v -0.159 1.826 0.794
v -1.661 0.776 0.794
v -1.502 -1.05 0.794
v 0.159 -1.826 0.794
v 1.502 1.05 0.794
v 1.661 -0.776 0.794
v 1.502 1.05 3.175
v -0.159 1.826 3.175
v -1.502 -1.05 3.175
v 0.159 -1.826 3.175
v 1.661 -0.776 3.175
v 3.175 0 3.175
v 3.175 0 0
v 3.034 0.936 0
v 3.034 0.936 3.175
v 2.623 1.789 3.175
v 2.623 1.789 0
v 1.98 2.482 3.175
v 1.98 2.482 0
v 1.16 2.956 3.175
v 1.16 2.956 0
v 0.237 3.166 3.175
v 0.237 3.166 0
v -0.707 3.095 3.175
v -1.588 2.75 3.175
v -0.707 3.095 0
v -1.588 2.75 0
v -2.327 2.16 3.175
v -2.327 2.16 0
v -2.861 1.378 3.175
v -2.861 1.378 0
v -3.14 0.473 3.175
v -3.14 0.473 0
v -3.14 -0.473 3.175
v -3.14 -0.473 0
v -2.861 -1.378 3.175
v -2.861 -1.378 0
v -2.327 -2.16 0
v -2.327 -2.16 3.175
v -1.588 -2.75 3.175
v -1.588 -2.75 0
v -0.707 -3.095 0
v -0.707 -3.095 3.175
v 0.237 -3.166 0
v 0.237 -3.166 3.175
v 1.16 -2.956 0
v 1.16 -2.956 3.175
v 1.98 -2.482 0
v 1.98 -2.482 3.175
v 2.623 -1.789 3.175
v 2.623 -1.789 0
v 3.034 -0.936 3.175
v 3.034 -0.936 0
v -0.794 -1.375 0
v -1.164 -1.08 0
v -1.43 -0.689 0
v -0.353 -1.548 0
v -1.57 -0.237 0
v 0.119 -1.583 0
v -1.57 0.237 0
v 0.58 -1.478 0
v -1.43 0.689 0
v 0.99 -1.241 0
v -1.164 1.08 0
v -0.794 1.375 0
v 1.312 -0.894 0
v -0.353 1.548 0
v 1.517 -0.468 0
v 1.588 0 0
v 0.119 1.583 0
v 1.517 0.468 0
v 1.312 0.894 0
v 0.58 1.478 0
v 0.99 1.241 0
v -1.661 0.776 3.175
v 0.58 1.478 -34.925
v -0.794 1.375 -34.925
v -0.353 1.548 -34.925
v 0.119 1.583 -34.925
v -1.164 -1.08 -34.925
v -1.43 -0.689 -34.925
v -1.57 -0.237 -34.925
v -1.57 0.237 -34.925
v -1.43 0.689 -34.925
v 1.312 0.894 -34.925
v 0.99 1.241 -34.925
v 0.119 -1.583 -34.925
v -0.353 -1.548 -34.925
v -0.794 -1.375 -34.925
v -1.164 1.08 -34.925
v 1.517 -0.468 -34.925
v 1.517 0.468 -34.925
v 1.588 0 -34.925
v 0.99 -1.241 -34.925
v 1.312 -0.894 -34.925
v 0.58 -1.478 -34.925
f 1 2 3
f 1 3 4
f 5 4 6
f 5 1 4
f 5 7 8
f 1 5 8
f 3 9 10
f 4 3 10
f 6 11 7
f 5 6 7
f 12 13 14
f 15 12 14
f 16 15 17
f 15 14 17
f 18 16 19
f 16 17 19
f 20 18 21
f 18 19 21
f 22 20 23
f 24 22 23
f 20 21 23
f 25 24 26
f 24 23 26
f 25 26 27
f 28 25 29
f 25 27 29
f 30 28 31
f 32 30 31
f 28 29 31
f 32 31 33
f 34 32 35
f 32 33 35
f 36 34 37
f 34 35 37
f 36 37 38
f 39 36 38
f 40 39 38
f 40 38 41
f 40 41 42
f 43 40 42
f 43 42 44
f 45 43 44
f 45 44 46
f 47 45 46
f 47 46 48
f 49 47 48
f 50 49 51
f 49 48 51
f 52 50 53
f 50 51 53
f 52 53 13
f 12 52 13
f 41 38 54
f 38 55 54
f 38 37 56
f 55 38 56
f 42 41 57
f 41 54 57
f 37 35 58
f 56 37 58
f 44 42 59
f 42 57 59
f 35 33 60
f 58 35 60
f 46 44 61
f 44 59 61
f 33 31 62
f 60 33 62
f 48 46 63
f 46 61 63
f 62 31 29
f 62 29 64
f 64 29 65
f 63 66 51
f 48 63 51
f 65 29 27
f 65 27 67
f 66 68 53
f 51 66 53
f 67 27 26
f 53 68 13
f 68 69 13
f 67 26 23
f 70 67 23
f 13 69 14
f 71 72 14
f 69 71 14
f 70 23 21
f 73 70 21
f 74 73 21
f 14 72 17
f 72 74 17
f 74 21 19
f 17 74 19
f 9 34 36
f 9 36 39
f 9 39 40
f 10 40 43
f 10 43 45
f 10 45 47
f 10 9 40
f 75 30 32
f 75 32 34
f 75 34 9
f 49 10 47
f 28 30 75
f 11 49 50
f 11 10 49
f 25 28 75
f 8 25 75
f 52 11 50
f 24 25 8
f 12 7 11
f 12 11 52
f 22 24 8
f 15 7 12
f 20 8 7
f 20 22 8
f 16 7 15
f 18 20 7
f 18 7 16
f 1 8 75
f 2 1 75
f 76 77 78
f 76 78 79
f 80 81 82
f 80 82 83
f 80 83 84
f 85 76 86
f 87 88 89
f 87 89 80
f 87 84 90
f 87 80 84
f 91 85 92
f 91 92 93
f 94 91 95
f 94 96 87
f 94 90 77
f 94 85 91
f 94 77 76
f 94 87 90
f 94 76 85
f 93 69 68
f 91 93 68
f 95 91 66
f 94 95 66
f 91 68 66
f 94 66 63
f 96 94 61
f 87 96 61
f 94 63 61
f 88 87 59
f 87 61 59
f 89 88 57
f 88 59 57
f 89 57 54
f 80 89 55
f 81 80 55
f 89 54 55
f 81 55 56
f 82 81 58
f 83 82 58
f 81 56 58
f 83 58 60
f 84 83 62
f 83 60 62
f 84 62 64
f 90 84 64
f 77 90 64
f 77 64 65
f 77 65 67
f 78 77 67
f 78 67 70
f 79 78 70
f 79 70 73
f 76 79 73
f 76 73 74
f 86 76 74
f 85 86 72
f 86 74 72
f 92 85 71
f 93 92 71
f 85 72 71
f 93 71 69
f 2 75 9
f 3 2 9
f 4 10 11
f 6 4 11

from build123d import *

# Parameters (mm, degrees)
F0_R     = 3.175
F1_DEPTH = 3.175
F2_R     = 1.5875
F3_DEPTH = 34.925
F5_DEPTH = 2.38125


with BuildPart() as f1:
    # F0 (on Top) → F1 (new body)
    with BuildSketch(Plane.XY):
        Circle(F0_R)
    extrude(amount=F1_DEPTH)

    # F2 (on face) → F3 (join)
    with BuildSketch(Plane(origin=(0, 0, 0), x_dir=(1, 0, 0), z_dir=(0, 0, -1))):
        Circle(F2_R)
    extrude(amount=F3_DEPTH)

    # F4 (on face) → F5 (cut)
    with BuildSketch(Plane.XY.offset(3.175)):
        Polygon((1.50224, 1.050468), (-0.158612, 1.826212), (-1.660852, 0.775744), (-1.50224, -1.050468), (0.158612, -1.826212), (1.660852, -0.775744), align=None)
    extrude(amount=-F5_DEPTH, mode=Mode.SUBTRACT)


solid = f1.part
